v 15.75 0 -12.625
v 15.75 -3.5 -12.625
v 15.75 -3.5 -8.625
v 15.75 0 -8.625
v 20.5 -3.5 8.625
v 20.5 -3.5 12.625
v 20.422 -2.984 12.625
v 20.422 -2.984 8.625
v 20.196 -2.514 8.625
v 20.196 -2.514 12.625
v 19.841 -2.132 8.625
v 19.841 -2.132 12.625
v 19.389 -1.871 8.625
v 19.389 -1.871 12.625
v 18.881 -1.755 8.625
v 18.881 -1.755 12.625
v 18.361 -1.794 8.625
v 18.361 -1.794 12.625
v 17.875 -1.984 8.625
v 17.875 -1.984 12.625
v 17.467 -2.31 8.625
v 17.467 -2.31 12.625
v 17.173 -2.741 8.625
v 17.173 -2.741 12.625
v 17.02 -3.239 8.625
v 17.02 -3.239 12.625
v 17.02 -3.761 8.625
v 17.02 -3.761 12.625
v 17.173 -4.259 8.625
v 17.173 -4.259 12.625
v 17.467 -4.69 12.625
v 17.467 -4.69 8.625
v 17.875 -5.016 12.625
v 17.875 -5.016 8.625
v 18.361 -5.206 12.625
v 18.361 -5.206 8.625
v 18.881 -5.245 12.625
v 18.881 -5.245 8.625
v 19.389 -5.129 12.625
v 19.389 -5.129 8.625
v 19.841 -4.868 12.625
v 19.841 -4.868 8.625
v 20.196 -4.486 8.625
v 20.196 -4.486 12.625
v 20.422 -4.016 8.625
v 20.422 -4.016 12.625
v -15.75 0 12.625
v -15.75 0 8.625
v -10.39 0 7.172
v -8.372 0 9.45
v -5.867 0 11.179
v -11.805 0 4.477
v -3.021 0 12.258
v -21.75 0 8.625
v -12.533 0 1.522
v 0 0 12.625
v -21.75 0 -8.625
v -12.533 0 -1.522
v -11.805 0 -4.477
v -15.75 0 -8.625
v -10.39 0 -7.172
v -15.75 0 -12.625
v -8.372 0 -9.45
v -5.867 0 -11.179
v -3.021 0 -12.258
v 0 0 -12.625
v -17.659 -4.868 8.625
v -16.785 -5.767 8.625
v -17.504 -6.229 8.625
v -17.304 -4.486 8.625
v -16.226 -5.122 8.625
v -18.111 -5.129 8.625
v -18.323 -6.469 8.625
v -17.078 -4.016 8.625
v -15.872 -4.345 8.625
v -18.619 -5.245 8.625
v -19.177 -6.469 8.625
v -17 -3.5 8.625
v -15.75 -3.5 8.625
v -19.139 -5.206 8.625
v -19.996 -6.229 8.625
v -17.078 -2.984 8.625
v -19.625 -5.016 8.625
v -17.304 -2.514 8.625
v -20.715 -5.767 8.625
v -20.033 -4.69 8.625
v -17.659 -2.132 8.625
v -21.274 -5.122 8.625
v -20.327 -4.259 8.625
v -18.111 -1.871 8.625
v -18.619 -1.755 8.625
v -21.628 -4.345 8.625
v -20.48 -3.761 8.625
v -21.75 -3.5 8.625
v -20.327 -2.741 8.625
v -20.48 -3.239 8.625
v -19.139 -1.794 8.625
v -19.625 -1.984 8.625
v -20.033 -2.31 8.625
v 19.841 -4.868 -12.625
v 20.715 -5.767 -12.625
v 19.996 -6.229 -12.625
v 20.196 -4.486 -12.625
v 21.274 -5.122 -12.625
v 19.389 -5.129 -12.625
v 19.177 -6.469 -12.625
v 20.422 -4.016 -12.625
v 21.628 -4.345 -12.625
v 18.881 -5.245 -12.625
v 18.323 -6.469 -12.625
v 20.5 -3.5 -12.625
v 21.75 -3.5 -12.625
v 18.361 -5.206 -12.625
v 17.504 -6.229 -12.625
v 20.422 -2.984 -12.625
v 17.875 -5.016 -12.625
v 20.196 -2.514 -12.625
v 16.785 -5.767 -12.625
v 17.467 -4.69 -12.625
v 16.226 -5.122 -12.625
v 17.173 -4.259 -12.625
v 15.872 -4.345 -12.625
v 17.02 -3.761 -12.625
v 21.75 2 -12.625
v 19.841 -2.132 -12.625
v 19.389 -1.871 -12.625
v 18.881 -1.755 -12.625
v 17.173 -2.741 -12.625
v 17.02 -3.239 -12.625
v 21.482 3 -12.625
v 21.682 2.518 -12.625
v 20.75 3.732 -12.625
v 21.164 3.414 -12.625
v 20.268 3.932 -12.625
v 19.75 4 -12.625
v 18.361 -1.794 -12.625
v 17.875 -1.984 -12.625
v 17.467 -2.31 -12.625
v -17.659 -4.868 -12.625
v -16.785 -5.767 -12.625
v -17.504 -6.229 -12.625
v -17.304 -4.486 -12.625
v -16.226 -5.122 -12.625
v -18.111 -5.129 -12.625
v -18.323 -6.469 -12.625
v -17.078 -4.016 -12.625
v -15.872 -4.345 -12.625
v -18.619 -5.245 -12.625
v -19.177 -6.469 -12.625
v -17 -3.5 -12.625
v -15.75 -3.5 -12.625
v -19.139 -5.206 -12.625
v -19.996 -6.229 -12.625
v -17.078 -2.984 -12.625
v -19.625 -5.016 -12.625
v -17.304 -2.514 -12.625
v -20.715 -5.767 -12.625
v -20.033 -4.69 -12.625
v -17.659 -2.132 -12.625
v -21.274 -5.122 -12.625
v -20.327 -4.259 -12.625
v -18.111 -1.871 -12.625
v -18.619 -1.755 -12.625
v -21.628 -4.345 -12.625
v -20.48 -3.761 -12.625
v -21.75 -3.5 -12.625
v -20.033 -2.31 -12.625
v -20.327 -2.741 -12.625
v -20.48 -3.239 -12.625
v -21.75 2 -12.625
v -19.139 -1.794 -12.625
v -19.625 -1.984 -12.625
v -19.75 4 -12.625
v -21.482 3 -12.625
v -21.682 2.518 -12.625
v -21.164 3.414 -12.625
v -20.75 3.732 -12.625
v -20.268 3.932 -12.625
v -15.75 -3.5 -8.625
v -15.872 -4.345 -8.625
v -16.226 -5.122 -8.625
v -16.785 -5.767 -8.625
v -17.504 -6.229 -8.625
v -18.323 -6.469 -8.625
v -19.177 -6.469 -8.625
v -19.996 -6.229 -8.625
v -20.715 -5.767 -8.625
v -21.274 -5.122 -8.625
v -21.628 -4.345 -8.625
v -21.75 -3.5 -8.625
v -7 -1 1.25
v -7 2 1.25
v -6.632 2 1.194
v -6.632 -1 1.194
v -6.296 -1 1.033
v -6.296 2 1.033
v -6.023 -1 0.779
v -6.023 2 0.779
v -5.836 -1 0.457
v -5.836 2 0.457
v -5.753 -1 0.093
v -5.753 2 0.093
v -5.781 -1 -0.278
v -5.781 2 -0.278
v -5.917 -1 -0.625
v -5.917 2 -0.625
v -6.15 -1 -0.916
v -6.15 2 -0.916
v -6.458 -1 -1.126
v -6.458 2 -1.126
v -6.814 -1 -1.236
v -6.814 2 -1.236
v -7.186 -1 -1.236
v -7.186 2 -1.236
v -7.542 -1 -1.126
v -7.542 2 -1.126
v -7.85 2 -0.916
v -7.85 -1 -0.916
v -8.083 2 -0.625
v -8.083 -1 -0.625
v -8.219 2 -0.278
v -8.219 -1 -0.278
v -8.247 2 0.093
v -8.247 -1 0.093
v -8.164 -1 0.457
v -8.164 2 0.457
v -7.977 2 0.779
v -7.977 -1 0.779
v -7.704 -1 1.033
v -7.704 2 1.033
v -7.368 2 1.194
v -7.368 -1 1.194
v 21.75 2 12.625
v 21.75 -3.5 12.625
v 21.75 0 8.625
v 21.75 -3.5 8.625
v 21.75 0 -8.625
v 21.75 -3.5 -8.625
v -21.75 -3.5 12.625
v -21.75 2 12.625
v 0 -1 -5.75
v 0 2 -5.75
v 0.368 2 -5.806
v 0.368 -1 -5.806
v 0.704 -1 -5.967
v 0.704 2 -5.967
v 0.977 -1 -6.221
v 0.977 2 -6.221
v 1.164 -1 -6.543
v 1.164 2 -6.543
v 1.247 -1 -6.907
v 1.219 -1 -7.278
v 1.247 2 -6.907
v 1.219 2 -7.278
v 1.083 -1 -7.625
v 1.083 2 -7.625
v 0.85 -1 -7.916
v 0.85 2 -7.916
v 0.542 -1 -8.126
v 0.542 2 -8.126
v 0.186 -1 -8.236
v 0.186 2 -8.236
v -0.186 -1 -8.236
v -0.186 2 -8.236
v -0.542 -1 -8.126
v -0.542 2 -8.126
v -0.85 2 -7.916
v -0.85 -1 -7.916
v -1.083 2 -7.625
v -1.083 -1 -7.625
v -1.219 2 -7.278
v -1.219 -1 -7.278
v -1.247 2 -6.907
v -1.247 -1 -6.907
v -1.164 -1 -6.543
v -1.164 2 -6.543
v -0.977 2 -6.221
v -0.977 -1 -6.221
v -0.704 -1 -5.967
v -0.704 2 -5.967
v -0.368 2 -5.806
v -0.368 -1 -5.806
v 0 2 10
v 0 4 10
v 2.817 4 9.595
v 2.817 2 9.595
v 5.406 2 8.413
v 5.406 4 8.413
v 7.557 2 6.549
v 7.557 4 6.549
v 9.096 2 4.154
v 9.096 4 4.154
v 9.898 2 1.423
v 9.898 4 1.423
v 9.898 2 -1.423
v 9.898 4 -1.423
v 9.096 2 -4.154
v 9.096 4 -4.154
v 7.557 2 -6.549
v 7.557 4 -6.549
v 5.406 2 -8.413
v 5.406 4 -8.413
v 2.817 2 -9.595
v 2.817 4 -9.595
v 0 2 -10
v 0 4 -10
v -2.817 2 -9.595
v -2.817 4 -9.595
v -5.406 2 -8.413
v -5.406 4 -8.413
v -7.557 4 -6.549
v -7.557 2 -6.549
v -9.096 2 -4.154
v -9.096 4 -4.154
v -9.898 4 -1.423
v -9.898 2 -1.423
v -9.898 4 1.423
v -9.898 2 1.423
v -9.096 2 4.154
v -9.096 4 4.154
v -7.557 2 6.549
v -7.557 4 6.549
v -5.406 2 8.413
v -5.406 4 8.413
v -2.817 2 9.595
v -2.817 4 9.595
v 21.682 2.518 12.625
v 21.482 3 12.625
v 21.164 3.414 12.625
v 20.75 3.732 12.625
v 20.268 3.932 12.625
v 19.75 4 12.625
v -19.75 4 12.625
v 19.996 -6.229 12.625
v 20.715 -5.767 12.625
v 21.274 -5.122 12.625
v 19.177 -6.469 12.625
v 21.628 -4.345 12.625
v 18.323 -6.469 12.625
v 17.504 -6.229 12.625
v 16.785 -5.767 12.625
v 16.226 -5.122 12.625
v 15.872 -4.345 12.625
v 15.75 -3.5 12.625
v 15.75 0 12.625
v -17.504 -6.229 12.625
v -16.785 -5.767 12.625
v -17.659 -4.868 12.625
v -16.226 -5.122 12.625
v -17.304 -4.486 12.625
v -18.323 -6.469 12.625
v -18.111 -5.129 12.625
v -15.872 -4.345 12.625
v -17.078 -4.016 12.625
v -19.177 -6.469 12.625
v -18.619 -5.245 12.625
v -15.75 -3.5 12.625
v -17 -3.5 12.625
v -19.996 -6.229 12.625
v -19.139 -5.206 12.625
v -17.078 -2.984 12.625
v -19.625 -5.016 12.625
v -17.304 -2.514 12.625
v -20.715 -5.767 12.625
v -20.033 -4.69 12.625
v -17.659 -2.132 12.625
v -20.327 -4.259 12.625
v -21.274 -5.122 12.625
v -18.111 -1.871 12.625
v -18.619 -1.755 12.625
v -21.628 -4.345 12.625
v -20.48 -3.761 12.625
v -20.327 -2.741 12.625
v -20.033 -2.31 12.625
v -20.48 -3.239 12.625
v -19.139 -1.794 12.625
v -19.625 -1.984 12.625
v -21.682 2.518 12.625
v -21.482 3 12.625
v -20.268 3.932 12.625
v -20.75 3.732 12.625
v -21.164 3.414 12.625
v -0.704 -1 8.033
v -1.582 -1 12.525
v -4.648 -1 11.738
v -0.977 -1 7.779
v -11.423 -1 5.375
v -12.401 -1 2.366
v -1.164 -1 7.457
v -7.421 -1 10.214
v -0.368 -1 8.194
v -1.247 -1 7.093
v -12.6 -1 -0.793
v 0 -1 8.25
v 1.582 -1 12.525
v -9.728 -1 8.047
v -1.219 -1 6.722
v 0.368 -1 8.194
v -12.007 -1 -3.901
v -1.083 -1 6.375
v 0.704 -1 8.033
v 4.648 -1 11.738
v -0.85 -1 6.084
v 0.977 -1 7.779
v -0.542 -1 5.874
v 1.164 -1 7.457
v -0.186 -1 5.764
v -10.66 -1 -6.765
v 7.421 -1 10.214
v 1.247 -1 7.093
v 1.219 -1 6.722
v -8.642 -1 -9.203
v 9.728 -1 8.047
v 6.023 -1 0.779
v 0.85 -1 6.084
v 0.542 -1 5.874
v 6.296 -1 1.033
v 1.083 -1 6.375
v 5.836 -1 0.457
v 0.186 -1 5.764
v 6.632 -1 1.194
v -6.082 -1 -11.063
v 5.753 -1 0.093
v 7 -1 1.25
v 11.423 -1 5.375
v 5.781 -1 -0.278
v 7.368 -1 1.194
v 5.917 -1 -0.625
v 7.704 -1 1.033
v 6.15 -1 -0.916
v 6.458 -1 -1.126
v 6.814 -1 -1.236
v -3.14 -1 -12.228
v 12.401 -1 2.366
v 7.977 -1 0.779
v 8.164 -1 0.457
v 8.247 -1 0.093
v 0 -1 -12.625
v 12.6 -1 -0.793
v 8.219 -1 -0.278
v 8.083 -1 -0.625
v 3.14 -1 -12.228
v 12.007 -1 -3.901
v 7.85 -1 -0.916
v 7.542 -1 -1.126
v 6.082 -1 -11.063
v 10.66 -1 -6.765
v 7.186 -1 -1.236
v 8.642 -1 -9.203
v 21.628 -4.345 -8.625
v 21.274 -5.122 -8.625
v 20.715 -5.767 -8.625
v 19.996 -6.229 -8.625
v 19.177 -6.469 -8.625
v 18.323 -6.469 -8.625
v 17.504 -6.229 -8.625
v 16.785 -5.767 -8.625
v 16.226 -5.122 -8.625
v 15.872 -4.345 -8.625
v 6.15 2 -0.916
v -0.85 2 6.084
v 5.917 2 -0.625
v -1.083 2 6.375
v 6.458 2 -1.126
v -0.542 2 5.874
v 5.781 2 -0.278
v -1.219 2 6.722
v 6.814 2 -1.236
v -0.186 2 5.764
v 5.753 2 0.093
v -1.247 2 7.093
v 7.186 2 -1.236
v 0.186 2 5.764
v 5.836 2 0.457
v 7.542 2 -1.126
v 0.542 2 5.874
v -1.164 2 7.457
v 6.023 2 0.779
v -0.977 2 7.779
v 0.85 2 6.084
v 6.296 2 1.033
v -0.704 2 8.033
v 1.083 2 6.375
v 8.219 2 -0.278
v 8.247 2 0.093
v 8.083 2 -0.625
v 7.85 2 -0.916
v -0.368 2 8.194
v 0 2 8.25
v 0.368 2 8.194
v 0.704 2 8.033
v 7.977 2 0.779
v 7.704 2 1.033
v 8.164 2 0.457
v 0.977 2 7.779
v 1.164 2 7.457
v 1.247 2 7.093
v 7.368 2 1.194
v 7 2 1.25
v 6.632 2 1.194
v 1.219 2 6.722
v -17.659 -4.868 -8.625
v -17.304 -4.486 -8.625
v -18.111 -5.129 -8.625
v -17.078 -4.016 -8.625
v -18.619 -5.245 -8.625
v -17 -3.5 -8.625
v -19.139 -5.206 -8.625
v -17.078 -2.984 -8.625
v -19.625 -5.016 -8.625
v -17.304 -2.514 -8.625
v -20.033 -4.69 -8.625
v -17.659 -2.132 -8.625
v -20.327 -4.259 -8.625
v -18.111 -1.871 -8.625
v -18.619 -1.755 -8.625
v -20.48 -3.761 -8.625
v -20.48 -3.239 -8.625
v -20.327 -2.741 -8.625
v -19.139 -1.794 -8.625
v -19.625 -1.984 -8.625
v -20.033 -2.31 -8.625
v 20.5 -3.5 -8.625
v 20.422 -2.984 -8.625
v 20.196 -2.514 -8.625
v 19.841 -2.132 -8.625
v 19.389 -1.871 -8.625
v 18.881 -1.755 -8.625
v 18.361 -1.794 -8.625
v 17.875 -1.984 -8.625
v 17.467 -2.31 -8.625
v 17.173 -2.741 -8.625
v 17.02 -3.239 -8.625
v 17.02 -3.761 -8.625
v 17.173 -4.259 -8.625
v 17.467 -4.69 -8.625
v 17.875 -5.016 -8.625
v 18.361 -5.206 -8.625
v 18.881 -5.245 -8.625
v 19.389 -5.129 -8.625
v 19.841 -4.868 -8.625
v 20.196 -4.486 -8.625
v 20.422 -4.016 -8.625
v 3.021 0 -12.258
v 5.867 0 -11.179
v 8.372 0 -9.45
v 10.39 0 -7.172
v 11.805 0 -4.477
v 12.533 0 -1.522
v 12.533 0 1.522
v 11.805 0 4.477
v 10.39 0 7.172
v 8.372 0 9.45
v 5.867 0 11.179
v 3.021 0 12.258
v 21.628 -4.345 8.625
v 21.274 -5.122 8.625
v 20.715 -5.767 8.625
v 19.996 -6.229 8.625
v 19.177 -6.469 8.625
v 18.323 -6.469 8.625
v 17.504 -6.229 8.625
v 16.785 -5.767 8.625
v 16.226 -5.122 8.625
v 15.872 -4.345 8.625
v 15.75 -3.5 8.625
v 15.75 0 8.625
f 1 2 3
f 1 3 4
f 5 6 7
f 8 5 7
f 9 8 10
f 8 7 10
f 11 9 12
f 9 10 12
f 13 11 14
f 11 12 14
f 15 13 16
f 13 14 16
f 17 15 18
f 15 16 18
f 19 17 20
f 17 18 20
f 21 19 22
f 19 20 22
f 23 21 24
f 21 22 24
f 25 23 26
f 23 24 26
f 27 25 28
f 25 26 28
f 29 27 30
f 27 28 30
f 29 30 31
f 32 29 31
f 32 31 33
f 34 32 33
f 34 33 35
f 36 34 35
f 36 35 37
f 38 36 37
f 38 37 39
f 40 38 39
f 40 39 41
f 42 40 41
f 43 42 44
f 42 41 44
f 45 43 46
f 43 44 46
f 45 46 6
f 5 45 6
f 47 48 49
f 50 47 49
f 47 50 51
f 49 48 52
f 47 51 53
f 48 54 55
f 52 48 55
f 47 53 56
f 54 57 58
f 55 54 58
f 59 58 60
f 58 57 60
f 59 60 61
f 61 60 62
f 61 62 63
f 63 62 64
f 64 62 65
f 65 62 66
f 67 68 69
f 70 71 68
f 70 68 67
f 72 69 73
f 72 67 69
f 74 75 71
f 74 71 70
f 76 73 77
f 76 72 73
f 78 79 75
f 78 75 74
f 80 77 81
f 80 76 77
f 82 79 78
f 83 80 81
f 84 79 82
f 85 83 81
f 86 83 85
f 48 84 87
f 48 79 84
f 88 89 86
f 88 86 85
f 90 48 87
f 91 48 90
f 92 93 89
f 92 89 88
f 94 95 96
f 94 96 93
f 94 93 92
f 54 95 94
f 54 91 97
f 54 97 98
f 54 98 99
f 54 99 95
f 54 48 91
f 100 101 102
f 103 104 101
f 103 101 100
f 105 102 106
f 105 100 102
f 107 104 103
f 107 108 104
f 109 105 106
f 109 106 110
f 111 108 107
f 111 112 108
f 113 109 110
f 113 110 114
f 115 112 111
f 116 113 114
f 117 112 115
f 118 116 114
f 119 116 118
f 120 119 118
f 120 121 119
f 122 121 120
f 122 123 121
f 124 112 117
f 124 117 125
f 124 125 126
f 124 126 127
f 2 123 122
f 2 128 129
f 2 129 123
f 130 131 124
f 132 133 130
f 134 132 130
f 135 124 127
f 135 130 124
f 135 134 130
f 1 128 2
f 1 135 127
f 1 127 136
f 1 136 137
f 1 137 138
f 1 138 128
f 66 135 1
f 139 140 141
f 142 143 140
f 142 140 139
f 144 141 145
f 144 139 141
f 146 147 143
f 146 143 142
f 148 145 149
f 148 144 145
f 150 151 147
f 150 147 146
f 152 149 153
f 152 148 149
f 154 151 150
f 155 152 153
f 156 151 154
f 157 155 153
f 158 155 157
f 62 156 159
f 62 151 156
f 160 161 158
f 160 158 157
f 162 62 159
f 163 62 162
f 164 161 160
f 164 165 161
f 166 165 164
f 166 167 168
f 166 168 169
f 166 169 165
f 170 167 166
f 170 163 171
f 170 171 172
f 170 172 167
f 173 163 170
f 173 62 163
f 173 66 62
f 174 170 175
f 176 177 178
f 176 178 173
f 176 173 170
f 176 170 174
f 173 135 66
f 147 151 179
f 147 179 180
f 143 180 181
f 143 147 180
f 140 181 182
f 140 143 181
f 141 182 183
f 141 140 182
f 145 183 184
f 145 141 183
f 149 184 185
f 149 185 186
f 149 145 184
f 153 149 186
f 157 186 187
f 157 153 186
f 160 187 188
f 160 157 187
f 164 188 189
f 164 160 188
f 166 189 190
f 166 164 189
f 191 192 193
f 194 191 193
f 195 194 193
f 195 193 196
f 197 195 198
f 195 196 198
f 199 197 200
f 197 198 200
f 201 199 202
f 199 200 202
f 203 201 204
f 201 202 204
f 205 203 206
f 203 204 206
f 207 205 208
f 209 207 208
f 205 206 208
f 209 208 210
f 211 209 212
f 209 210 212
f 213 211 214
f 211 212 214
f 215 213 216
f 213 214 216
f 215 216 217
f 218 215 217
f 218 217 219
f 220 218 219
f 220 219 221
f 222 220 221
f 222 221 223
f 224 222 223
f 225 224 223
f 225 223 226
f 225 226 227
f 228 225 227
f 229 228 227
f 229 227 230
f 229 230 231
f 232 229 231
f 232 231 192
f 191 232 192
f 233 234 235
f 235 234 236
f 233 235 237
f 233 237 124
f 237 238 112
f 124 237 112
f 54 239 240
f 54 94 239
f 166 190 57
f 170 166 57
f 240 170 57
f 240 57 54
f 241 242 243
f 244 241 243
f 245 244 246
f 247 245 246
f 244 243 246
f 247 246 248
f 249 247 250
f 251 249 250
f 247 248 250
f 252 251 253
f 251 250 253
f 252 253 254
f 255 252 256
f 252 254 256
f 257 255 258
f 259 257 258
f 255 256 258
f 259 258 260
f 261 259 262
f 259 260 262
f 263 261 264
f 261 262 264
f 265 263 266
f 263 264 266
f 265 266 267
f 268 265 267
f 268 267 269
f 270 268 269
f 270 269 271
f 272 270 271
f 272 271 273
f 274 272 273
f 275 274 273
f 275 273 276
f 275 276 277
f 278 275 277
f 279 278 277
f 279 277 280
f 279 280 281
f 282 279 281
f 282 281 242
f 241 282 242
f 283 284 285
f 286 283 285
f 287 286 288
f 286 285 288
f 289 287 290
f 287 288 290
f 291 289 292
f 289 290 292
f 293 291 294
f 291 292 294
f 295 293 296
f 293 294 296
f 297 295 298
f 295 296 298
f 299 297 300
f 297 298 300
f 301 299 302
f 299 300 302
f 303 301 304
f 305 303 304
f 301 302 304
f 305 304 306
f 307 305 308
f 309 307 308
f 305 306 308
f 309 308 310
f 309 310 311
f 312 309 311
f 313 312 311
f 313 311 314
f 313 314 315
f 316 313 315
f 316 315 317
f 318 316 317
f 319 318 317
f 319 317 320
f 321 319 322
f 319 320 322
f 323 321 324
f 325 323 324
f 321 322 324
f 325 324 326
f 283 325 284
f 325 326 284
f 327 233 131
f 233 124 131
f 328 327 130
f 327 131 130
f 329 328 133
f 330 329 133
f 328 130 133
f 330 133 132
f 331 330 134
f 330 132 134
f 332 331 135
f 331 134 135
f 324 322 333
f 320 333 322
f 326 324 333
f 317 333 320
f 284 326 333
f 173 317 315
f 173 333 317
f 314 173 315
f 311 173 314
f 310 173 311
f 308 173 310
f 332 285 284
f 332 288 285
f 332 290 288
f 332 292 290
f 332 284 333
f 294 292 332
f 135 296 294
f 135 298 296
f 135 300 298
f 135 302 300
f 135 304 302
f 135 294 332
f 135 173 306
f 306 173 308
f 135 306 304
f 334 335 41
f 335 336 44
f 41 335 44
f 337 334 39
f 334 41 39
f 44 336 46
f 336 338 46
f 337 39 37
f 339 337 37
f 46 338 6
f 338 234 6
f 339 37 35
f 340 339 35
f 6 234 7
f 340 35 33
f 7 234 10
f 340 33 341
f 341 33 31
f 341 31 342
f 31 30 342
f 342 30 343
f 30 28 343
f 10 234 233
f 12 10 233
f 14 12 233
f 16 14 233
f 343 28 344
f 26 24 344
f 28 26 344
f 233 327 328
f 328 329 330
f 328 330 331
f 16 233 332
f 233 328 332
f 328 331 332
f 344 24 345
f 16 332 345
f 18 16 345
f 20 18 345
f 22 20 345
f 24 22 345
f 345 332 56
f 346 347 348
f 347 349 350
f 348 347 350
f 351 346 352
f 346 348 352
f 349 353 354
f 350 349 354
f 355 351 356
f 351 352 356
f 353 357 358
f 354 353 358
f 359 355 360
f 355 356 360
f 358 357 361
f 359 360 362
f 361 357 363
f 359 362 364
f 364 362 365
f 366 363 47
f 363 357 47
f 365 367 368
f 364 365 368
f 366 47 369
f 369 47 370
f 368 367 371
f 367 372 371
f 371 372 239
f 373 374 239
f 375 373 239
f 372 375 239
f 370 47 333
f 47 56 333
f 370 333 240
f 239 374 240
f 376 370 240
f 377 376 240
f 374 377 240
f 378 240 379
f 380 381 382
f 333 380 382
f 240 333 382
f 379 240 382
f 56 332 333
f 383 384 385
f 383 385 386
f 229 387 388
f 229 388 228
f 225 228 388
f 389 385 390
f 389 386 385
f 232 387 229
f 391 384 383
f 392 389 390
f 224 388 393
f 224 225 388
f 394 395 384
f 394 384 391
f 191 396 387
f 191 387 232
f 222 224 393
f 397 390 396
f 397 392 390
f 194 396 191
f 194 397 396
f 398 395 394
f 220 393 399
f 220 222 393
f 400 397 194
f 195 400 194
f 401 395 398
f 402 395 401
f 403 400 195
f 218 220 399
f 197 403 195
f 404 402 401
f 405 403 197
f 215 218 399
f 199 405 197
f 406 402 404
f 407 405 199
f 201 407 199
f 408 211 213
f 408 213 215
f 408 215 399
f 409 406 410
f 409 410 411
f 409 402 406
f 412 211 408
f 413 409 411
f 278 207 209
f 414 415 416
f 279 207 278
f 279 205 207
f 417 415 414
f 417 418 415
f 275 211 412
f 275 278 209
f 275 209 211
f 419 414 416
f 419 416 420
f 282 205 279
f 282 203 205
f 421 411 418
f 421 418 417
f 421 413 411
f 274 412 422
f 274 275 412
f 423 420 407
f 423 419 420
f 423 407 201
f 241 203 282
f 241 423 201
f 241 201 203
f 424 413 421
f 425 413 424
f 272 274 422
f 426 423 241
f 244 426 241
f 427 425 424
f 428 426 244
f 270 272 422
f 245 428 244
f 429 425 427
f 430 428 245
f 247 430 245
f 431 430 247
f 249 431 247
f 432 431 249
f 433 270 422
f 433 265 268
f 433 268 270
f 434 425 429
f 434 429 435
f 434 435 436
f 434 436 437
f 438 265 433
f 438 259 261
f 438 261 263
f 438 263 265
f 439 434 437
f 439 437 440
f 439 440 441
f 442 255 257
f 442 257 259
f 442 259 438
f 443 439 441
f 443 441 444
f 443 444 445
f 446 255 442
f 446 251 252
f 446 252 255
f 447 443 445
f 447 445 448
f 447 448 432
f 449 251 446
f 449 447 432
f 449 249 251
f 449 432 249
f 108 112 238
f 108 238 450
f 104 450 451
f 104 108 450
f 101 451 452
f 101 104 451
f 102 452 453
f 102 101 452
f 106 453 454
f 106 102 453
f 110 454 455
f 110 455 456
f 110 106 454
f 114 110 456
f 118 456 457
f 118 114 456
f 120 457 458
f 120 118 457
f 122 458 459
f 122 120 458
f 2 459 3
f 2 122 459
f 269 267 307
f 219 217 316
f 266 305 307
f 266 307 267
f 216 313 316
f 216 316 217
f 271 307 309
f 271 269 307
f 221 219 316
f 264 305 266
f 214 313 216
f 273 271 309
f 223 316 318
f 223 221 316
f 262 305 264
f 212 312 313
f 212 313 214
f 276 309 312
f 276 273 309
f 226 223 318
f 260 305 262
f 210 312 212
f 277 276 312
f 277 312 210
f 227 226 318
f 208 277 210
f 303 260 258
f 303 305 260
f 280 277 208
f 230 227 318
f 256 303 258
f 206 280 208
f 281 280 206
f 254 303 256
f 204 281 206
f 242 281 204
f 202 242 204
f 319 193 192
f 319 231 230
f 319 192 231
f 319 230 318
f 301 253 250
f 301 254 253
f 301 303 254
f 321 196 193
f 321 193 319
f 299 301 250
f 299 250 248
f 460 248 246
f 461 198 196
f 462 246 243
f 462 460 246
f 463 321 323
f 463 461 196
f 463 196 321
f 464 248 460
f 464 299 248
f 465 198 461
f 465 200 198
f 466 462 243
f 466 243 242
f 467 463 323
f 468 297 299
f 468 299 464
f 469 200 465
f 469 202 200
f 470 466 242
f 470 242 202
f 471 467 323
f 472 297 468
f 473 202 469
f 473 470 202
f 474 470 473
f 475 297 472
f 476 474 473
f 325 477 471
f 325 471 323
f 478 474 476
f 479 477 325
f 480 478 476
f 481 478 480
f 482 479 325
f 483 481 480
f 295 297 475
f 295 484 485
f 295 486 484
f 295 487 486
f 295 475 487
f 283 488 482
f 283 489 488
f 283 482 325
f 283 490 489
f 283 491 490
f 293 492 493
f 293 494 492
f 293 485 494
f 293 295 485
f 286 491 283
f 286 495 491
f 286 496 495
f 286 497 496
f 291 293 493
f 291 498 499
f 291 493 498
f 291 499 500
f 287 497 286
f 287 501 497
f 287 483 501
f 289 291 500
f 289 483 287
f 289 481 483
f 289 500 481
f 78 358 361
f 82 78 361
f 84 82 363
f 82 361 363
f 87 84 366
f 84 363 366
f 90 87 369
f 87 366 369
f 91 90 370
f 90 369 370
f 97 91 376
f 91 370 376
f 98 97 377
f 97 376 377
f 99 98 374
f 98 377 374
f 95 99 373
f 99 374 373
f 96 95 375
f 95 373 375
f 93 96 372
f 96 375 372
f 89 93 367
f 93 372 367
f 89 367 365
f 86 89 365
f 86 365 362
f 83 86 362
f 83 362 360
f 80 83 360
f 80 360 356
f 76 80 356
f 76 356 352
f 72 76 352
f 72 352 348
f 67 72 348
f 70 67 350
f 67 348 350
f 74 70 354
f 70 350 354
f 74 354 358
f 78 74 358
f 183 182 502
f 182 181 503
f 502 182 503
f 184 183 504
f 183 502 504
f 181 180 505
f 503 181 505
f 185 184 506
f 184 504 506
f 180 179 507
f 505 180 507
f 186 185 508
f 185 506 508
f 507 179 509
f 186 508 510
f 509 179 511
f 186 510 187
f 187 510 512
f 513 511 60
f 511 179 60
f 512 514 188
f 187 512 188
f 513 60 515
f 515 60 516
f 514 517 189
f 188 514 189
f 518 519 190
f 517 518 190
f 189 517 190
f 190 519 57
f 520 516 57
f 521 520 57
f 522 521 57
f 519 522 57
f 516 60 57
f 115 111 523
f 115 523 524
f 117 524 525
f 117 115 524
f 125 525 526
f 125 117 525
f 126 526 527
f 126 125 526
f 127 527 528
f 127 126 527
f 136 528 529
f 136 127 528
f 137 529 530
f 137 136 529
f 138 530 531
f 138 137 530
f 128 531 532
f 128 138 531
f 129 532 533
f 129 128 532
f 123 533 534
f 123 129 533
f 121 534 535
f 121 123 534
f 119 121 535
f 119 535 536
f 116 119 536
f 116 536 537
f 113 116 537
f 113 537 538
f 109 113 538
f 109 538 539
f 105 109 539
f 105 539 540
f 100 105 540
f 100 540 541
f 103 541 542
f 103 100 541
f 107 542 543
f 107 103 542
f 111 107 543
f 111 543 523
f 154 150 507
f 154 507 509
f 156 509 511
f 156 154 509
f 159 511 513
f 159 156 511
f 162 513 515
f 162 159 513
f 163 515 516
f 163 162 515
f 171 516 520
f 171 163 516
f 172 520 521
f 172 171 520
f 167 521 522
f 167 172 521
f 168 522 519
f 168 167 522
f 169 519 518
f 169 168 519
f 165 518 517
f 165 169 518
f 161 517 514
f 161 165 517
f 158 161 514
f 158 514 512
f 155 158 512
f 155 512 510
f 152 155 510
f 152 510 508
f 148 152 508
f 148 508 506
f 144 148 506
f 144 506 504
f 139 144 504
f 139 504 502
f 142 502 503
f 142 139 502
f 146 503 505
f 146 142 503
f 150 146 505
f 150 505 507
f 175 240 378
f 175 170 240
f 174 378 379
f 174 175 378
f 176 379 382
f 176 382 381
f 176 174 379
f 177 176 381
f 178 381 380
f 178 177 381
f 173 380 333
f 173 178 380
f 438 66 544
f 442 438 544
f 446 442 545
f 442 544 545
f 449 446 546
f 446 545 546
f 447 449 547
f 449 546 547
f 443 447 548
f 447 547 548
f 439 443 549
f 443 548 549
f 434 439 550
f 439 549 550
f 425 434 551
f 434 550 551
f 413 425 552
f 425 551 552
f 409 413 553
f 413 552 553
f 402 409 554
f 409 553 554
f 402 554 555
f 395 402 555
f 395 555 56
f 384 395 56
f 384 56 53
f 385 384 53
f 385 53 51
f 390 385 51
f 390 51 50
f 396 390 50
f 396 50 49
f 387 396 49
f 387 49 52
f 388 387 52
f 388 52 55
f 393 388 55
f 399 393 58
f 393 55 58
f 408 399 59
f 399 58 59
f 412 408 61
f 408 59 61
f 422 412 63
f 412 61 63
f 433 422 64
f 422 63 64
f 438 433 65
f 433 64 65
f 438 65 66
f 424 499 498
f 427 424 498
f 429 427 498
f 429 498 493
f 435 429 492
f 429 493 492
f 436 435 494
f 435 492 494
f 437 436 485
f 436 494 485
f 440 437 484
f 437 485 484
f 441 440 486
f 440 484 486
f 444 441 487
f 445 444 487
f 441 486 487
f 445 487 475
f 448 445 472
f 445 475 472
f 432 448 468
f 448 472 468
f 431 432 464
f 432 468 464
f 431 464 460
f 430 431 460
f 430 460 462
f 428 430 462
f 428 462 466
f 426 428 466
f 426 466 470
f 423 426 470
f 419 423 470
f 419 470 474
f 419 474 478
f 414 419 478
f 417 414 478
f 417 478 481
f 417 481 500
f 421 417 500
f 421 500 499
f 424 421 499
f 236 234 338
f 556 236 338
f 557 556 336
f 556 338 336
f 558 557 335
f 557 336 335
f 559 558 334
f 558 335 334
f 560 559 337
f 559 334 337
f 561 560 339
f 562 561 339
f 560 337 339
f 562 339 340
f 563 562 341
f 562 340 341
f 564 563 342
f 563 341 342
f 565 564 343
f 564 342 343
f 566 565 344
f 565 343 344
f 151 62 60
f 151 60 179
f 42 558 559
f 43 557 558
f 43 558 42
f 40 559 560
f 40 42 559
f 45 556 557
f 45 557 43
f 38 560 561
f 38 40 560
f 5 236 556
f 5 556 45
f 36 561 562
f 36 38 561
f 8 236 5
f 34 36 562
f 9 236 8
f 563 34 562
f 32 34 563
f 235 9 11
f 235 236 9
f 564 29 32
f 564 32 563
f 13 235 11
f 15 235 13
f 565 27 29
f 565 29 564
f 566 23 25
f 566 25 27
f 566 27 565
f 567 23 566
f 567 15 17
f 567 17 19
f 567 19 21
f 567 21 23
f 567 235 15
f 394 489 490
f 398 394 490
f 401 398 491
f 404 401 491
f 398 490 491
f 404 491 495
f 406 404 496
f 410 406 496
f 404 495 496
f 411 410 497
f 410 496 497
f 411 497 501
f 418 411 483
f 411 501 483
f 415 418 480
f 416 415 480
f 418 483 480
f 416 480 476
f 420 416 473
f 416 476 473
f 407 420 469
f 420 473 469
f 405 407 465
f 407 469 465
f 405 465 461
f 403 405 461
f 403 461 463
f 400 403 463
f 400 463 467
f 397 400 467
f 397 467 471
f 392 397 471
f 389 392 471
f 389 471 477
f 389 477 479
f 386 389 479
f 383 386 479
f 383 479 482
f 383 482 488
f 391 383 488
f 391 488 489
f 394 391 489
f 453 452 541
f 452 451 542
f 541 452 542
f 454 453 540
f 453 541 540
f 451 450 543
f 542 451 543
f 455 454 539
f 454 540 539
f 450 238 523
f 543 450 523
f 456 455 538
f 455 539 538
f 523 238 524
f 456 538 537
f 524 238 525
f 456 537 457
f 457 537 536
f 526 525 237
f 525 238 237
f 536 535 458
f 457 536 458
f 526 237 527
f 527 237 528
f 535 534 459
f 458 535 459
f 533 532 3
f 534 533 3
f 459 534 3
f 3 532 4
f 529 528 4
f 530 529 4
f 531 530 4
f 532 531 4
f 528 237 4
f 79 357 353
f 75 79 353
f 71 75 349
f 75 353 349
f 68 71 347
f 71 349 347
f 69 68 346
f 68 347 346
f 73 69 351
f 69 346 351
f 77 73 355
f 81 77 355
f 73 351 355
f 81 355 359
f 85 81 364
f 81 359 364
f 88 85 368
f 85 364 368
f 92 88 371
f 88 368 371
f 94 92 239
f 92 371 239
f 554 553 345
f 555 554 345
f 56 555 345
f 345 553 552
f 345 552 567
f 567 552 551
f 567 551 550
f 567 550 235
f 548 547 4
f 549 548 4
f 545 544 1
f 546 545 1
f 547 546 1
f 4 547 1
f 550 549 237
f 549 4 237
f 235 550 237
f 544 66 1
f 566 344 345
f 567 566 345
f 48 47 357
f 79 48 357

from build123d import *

# Parameters (mm, degrees)
SKETCH1_W           = 43.5
SKETCH1_H           = 25.25
BOSS_EXTRUDE1_DEPTH = 4
SKETCH5_R           = 10
CUT_EXTRUDE3_DEPTH  = 2
SKETCH6_R           = 12.625
BOSS_EXTRUDE3_DEPTH = 1
SKETCH2_R           = 1.25
CUT_EXTRUDE4_DEPTH  = 26.640848757
SKETCH4_R           = 1.75
BOSS_EXTRUDE2_DEPTH = 4
FILLET1_R           = 2


with BuildPart() as part:
    # Sketch1 → Boss-Extrude1 (new body)
    with BuildSketch(Plane(origin=(0, 0, 0), x_dir=(1, 0, 0), z_dir=(0, 1, 0))):
        Rectangle(SKETCH1_W, SKETCH1_H)
    extrude(amount=BOSS_EXTRUDE1_DEPTH)

    # Sketch5 → Cut-Extrude3 (cut)
    with BuildSketch(Plane(origin=(0, 4, 0), x_dir=(1, 0, 0), z_dir=(0, 1, 0))):
        with Locations(Location((0, 0, 0), (0, 0, 270))):
            Circle(SKETCH5_R)
    extrude(amount=-CUT_EXTRUDE3_DEPTH, mode=Mode.SUBTRACT)

    # Sketch6 → Boss-Extrude3 (add)
    with BuildSketch(Plane.XZ):
        with Locations(Location((0, 0, 0), (0, 0, 270))):
            Circle(SKETCH6_R)
    extrude(amount=BOSS_EXTRUDE3_DEPTH)

    # Sketch2 → Cut-Extrude4 (cut, through all)
    with BuildSketch(Plane(origin=(0, 4, 0), x_dir=(1, 0, 0), z_dir=(0, 1, 0))):
        with Locations(Location((0, 7, 0), (0, 0, 270))):
            Circle(SKETCH2_R)
        with Locations(Location((7, 0, 0), (0, 0, 270))):
            Circle(SKETCH2_R)
        with Locations(Location((0, -7, 0), (0, 0, 270))):
            Circle(SKETCH2_R)
        with Locations(Location((-7, 0, 0), (0, 0, 270))):
            Circle(SKETCH2_R)
    extrude(amount=-CUT_EXTRUDE4_DEPTH, mode=Mode.SUBTRACT)

    # Sketch4 → Boss-Extrude2 (add)
    # profile 1 of 2: a face of its own
    with BuildSketch(Plane.XY.offset(12.625)):
        with BuildLine():
            Line((-21.75, 0), (-15.75, 0))
            Line((-15.75, 0), (-15.75, -3.5))
            ThreePointArc((-15.75, -3.5), (-18.75, -6.5), (-21.75, -3.5))
            Line((-21.75, -3.5), (-21.75, 0))
        make_face()
        with Locations((-18.75, -3.5)):
            Circle(SKETCH4_R, mode=Mode.SUBTRACT)
    # profile 2 of 2: a face of its own
    with BuildSketch(Plane.XY.offset(12.625)):
        with BuildLine():
            Line((21.75, 0), (21.75, -3.5))
            ThreePointArc((21.75, -3.5), (18.75, -6.5), (15.75, -3.5))
            Line((15.75, -3.5), (15.75, 0))
            Line((15.75, 0), (21.75, 0))
        make_face()
        with Locations((18.75, -3.5)):
            Circle(SKETCH4_R, mode=Mode.SUBTRACT)
    boss_extrude2 = extrude(amount=-BOSS_EXTRUDE2_DEPTH)

    # Mirror1: Boss-Extrude2 across plane
    add(boss_extrude2.mirror(Plane.XY))

    # Fillet1
    fillet1_edges = [part.edges().sort_by_distance(p)[0] for p in [
        (-21.75, 4, 0),
        (21.75, 4, 0),
    ]]
    fillet(fillet1_edges, radius=FILLET1_R)


solid = part.part
